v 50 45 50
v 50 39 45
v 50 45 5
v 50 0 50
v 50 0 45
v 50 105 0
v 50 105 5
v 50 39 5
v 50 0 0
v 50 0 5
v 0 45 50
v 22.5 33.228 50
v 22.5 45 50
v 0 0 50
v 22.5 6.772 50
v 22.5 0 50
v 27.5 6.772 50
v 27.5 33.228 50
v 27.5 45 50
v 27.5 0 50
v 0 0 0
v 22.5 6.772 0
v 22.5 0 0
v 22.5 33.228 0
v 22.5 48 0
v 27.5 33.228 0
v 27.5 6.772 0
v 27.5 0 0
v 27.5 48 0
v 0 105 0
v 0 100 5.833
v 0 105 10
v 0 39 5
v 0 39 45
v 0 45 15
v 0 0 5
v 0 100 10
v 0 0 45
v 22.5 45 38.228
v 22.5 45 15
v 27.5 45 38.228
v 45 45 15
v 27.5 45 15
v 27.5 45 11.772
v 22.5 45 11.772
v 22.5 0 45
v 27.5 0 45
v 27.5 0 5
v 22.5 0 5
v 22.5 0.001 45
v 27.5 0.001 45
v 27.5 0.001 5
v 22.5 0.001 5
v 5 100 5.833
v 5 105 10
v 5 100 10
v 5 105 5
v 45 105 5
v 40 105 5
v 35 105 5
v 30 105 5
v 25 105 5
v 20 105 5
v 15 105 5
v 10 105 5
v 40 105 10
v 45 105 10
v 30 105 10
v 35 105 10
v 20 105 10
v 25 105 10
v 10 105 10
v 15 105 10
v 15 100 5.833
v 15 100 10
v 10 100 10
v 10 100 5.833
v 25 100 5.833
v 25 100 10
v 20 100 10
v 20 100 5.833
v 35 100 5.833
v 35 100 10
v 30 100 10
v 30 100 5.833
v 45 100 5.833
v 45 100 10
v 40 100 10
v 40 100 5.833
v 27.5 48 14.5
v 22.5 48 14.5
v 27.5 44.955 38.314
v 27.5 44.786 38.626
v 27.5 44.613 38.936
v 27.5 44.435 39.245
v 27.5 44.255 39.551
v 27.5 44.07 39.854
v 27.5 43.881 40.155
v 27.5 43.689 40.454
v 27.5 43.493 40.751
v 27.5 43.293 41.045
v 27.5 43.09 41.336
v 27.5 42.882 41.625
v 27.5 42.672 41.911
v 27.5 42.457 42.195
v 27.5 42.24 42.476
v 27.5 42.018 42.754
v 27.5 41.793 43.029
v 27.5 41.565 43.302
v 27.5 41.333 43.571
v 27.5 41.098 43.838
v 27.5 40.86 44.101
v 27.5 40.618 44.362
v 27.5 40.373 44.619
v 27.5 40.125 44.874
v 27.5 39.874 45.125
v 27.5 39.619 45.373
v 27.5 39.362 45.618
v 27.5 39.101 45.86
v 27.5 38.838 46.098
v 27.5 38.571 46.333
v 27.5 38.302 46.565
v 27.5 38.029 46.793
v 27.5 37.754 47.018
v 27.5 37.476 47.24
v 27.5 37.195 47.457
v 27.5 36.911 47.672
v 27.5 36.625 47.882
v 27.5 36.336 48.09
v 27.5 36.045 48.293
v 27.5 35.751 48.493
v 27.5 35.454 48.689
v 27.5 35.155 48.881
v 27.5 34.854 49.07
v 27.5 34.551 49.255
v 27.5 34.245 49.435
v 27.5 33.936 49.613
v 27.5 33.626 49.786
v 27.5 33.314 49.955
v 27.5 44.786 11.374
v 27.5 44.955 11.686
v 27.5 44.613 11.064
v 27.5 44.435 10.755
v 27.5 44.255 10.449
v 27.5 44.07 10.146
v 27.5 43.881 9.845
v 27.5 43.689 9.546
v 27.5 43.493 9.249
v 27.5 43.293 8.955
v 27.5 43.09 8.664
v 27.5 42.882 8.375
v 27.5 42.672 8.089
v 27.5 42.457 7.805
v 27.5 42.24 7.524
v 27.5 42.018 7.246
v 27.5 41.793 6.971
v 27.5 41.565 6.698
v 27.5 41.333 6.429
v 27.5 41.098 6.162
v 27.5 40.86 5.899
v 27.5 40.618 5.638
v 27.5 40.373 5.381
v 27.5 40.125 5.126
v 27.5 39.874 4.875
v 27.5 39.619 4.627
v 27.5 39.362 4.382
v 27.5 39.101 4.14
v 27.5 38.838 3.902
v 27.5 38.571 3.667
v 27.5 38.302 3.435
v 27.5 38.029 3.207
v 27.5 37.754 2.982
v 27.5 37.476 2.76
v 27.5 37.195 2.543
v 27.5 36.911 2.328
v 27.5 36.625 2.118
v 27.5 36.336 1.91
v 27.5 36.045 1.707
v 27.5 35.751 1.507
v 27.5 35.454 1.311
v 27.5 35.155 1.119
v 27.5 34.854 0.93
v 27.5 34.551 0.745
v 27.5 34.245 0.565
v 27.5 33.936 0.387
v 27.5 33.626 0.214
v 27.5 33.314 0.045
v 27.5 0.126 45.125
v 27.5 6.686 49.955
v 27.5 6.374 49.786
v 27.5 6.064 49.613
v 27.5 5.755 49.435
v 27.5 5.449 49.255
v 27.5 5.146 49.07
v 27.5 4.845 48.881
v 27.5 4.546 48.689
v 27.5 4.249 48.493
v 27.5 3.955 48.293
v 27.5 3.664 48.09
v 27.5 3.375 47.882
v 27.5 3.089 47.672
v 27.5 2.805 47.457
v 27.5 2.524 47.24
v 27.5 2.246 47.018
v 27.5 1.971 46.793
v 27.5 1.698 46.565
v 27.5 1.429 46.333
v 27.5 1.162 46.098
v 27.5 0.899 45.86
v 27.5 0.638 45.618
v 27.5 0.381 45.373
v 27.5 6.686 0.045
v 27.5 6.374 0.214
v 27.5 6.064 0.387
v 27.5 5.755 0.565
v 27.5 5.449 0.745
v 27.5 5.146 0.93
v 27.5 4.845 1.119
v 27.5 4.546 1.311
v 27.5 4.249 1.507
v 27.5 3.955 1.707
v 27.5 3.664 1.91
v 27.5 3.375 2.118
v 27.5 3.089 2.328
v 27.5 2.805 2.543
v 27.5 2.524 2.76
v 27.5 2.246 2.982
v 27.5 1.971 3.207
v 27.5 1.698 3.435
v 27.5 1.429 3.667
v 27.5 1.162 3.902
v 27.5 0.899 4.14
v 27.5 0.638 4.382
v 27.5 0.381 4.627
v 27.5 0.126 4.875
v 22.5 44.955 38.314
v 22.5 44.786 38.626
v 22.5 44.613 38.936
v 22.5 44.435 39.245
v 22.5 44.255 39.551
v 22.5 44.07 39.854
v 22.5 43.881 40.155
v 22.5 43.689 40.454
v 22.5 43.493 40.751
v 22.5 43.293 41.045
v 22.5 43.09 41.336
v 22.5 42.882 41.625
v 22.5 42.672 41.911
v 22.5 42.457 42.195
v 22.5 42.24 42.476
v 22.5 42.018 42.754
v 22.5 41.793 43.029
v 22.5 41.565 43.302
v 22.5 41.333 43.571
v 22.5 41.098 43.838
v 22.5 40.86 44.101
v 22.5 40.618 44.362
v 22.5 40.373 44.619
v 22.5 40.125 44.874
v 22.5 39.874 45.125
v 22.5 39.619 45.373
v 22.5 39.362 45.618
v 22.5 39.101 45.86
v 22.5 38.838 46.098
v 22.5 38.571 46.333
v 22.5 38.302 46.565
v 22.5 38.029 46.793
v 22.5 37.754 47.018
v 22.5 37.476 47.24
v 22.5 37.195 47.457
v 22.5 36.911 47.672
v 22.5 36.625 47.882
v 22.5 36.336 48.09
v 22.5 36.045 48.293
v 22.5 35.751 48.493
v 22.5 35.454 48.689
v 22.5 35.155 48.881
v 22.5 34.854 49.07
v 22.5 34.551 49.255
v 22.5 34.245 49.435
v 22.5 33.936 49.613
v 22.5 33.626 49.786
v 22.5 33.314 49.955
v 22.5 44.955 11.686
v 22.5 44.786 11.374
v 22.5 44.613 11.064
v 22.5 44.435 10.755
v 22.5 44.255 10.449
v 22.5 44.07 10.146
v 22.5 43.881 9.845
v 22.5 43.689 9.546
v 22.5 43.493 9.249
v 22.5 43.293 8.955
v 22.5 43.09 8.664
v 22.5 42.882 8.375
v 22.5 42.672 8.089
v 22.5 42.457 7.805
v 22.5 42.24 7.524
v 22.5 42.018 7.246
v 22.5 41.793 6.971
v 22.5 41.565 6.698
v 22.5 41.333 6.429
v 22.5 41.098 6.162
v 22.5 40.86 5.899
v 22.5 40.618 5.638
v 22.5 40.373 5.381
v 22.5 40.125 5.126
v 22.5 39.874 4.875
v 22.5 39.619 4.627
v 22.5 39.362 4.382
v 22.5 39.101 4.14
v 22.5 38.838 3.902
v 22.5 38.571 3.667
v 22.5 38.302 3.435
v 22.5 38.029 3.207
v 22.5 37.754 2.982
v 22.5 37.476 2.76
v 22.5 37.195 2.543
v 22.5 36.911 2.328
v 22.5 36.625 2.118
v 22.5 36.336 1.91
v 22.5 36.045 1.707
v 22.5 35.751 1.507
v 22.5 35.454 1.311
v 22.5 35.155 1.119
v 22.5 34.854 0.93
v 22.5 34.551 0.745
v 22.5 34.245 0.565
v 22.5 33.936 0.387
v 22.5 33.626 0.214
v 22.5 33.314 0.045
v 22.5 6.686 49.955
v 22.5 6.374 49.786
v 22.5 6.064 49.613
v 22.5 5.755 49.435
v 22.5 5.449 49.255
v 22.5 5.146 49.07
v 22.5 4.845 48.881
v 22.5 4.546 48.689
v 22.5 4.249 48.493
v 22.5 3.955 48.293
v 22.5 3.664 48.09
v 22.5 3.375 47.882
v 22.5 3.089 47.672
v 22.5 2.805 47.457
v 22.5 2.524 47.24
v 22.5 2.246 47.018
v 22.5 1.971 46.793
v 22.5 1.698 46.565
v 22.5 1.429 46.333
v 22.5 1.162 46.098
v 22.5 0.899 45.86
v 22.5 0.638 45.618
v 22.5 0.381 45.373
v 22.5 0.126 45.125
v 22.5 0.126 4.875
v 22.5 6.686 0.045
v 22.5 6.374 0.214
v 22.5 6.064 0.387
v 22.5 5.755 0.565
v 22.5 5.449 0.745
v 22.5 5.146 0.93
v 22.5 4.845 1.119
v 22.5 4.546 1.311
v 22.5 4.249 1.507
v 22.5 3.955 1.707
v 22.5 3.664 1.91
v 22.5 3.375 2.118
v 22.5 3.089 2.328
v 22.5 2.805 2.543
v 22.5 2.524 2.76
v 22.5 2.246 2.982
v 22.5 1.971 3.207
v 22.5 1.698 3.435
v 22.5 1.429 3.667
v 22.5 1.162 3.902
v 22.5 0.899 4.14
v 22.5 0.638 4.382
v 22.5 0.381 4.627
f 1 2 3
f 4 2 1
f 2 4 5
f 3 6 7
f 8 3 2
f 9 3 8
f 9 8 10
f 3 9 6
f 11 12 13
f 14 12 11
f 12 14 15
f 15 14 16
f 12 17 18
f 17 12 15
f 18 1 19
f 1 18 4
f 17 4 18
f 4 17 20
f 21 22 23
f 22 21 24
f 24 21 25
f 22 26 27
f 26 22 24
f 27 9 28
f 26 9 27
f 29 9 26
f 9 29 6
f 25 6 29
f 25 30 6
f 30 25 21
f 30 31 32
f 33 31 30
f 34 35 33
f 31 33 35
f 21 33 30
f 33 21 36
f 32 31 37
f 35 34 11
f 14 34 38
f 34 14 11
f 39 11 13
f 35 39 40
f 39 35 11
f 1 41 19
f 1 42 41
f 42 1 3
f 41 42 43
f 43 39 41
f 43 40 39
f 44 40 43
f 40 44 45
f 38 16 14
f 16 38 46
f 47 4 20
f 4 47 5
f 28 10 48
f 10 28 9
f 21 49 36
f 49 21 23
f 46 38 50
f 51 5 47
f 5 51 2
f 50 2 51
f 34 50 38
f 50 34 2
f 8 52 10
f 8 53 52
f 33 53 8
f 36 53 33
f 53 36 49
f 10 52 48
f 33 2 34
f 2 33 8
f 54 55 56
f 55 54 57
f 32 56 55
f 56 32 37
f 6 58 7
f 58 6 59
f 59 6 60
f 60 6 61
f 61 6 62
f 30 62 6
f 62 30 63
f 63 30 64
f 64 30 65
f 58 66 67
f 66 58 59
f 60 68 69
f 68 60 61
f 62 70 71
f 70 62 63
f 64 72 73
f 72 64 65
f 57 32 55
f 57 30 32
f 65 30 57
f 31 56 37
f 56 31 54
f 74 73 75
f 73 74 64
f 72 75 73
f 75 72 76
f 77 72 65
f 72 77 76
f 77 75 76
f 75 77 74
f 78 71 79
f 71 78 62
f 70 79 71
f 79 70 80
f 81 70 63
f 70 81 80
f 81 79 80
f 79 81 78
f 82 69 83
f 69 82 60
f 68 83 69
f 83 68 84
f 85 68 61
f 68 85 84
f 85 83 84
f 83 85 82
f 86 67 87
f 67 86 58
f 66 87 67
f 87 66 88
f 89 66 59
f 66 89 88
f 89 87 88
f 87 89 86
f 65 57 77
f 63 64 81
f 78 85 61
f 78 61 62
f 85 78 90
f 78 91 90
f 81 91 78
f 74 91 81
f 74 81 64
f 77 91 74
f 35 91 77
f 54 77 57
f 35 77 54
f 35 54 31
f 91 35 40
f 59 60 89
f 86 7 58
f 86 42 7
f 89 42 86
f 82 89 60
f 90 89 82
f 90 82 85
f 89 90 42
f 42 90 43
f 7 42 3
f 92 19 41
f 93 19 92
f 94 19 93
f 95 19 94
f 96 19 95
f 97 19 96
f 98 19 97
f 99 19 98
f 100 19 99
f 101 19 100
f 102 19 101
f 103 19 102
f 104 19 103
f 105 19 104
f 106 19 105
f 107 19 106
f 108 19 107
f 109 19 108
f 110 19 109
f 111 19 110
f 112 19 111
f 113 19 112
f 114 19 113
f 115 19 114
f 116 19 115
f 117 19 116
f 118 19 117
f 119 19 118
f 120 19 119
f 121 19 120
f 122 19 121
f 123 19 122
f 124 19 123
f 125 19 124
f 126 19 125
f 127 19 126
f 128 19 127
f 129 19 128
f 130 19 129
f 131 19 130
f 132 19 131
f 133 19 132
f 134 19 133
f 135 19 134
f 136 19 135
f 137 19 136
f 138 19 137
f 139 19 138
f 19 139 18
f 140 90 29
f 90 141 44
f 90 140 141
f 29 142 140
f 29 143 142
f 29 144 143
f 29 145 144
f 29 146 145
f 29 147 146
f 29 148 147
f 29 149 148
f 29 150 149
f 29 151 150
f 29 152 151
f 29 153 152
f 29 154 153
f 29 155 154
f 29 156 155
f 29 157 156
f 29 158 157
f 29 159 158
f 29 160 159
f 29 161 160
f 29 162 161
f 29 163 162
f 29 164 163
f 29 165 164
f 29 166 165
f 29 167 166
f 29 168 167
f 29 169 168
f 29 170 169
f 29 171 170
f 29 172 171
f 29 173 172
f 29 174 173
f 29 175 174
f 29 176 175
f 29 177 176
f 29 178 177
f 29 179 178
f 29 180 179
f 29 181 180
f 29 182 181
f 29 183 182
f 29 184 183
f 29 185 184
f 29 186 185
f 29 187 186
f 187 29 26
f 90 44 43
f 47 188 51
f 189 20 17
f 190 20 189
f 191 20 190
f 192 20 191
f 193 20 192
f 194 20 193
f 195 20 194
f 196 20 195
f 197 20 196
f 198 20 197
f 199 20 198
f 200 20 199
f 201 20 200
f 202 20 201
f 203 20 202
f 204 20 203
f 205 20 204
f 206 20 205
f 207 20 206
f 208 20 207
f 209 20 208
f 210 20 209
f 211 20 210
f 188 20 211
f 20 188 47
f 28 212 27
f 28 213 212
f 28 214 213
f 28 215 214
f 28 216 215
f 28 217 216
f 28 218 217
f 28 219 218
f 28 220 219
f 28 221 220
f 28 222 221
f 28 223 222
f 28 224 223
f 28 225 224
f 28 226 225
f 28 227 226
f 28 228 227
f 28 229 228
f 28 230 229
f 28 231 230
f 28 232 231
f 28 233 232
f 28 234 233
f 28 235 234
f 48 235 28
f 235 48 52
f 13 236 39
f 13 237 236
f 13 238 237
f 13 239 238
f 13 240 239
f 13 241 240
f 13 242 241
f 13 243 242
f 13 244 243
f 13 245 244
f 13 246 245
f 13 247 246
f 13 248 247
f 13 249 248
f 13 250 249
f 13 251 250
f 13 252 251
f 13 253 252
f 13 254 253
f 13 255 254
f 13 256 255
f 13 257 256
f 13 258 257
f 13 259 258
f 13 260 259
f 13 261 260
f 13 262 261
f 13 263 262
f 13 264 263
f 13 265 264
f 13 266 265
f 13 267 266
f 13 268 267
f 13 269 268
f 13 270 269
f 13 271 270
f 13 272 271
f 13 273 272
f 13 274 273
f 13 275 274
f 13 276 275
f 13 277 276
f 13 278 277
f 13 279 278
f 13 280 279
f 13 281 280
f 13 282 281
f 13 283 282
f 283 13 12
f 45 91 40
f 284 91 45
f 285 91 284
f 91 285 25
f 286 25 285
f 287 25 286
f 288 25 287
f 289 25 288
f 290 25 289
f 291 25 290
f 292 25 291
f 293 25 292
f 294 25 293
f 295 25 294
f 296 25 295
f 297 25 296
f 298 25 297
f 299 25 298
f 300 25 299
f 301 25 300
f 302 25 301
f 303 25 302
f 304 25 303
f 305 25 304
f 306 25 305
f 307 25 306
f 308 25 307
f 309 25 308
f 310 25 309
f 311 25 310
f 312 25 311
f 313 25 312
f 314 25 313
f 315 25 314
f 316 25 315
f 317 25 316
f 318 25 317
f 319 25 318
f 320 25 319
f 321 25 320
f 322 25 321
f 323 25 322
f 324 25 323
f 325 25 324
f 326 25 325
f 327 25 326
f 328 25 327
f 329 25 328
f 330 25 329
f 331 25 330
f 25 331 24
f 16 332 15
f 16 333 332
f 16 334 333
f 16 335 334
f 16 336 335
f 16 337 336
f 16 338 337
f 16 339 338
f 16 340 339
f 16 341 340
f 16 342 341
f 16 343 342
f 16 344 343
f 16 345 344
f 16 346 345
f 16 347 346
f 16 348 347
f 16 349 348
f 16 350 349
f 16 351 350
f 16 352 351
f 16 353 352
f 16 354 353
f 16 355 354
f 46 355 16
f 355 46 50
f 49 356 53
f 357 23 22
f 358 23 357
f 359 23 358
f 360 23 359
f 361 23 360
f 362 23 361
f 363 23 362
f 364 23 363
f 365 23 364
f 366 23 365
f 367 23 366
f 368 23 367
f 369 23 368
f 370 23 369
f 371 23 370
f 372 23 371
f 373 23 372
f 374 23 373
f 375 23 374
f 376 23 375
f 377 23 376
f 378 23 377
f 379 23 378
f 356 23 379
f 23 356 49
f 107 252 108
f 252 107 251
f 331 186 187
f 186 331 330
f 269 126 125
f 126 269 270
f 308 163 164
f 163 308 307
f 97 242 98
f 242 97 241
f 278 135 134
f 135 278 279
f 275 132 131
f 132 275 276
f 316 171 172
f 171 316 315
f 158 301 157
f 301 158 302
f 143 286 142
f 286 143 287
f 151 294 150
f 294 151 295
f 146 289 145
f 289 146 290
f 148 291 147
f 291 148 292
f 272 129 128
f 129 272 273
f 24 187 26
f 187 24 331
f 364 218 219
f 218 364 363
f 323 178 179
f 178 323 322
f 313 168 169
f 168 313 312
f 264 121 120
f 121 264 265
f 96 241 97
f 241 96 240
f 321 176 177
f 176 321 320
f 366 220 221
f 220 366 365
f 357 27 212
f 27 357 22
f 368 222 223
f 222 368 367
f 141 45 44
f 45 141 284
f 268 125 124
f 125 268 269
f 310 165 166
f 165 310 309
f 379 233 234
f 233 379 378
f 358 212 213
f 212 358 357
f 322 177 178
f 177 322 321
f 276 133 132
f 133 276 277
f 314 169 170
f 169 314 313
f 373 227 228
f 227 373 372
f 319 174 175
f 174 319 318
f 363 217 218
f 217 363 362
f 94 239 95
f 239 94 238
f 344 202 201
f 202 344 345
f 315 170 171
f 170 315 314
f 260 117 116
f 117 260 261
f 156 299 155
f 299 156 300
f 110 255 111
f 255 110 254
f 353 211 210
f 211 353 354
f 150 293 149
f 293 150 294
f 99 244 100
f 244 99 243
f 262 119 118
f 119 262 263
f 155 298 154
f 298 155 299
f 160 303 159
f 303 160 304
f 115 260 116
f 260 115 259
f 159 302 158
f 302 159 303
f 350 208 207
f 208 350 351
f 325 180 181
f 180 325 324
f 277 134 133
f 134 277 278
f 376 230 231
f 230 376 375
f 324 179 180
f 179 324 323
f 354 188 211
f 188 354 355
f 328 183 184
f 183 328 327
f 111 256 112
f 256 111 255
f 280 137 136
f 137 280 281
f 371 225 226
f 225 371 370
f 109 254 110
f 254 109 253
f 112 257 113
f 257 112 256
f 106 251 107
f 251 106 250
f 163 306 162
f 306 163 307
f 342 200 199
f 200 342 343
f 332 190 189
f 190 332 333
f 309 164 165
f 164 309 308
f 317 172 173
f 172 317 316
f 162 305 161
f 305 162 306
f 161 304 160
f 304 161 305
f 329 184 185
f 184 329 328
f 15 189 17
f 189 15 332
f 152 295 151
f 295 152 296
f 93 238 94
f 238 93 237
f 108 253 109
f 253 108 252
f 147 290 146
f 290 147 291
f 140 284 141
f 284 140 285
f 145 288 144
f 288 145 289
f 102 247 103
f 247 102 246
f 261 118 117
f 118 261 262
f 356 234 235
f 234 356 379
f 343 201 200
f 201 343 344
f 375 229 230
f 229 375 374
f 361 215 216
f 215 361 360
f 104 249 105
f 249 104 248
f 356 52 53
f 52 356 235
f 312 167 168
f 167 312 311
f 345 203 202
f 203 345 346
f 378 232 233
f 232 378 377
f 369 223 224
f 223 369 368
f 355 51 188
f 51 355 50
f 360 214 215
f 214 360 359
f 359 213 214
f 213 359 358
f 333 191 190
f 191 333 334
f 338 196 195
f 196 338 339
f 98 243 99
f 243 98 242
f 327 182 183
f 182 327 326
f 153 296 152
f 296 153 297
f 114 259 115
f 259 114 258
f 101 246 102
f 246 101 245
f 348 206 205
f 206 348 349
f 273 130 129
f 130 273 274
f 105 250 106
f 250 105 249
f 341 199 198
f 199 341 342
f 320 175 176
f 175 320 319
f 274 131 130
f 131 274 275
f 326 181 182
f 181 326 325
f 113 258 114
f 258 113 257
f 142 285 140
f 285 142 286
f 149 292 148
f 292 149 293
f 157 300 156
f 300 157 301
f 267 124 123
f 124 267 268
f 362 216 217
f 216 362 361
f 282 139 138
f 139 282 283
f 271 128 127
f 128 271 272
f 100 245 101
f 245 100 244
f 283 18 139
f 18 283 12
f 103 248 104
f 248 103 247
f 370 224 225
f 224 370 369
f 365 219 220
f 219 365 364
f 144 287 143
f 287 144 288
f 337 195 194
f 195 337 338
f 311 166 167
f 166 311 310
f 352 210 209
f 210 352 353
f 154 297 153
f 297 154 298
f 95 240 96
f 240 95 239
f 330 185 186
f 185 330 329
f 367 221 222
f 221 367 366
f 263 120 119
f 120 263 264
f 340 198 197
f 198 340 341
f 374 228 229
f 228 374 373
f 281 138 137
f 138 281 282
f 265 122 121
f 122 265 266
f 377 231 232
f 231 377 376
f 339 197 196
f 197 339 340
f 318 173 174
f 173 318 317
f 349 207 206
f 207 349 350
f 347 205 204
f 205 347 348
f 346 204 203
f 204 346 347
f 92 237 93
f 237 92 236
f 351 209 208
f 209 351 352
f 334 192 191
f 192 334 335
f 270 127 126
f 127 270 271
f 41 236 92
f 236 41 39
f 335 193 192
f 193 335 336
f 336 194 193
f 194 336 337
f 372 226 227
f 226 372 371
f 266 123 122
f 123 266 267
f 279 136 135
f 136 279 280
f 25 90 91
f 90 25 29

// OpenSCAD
/**
* @author Maciej Urbanski (rooter@kyberian.net)
* @brief  Foot door pull - horizontal
* @license GPL
* @date   May, 2020
* @version 1.0
*
* Foot door pool for front gate (square bars).
*/

gatebar_width=40;
gatebar_depth=gatebar_width;

thickness=5;

step_length=60;
step_max_height=3*thickness;
step_width=40;
step_tooth_height=thickness;
step_tooth_width=thickness;
step_tooth_spacing=thickness;

ziptie_width=5;
ziptie_thickness=3;


$fn=500;
TINY=1; // a small number, just to make to avoid renderer issues
INF=10000; // a large number, virtually infitive


grab_w=gatebar_width+2*thickness;
grab_d=gatebar_depth+thickness;


difference() {
    union() {    
        difference() {
            cube([grab_w, grab_d, gatebar_width+2*thickness]);
            translate([-TINY, -TINY, thickness]) cube([INF, gatebar_width, gatebar_depth]);
        }
        
        translate([-(step_width-gatebar_width)/2, grab_d-thickness, 0]) {
            hull() {
                cube([step_width+2*thickness, step_length+thickness, thickness]);
                translate([0,0,step_max_height-thickness]) cube([step_width+thickness, thickness, thickness]);
            }
            for(tooth_x=[0:step_tooth_width+step_tooth_spacing:step_width]) {            translate([tooth_x,step_length,thickness]) {
                    cube([step_tooth_width, step_tooth_width, step_tooth_height]);
                }
            }
        }
        
    }
    
    rr=gatebar_width*sqrt(2)/2;
    translate([(grab_w-ziptie_width)/2, 0, 0]) {
        difference() {
            cube([ziptie_width, grab_d, gatebar_width+2*thickness]);
            translate([0,gatebar_width/2, gatebar_width/2+thickness]) {
                rotate([0,90,0]) cylinder(h=ziptie_width, r=rr);
            }
        }
        translate([0,grab_d,-TINY]) cube([ziptie_width, ziptie_thickness, INF]);
    }
}
